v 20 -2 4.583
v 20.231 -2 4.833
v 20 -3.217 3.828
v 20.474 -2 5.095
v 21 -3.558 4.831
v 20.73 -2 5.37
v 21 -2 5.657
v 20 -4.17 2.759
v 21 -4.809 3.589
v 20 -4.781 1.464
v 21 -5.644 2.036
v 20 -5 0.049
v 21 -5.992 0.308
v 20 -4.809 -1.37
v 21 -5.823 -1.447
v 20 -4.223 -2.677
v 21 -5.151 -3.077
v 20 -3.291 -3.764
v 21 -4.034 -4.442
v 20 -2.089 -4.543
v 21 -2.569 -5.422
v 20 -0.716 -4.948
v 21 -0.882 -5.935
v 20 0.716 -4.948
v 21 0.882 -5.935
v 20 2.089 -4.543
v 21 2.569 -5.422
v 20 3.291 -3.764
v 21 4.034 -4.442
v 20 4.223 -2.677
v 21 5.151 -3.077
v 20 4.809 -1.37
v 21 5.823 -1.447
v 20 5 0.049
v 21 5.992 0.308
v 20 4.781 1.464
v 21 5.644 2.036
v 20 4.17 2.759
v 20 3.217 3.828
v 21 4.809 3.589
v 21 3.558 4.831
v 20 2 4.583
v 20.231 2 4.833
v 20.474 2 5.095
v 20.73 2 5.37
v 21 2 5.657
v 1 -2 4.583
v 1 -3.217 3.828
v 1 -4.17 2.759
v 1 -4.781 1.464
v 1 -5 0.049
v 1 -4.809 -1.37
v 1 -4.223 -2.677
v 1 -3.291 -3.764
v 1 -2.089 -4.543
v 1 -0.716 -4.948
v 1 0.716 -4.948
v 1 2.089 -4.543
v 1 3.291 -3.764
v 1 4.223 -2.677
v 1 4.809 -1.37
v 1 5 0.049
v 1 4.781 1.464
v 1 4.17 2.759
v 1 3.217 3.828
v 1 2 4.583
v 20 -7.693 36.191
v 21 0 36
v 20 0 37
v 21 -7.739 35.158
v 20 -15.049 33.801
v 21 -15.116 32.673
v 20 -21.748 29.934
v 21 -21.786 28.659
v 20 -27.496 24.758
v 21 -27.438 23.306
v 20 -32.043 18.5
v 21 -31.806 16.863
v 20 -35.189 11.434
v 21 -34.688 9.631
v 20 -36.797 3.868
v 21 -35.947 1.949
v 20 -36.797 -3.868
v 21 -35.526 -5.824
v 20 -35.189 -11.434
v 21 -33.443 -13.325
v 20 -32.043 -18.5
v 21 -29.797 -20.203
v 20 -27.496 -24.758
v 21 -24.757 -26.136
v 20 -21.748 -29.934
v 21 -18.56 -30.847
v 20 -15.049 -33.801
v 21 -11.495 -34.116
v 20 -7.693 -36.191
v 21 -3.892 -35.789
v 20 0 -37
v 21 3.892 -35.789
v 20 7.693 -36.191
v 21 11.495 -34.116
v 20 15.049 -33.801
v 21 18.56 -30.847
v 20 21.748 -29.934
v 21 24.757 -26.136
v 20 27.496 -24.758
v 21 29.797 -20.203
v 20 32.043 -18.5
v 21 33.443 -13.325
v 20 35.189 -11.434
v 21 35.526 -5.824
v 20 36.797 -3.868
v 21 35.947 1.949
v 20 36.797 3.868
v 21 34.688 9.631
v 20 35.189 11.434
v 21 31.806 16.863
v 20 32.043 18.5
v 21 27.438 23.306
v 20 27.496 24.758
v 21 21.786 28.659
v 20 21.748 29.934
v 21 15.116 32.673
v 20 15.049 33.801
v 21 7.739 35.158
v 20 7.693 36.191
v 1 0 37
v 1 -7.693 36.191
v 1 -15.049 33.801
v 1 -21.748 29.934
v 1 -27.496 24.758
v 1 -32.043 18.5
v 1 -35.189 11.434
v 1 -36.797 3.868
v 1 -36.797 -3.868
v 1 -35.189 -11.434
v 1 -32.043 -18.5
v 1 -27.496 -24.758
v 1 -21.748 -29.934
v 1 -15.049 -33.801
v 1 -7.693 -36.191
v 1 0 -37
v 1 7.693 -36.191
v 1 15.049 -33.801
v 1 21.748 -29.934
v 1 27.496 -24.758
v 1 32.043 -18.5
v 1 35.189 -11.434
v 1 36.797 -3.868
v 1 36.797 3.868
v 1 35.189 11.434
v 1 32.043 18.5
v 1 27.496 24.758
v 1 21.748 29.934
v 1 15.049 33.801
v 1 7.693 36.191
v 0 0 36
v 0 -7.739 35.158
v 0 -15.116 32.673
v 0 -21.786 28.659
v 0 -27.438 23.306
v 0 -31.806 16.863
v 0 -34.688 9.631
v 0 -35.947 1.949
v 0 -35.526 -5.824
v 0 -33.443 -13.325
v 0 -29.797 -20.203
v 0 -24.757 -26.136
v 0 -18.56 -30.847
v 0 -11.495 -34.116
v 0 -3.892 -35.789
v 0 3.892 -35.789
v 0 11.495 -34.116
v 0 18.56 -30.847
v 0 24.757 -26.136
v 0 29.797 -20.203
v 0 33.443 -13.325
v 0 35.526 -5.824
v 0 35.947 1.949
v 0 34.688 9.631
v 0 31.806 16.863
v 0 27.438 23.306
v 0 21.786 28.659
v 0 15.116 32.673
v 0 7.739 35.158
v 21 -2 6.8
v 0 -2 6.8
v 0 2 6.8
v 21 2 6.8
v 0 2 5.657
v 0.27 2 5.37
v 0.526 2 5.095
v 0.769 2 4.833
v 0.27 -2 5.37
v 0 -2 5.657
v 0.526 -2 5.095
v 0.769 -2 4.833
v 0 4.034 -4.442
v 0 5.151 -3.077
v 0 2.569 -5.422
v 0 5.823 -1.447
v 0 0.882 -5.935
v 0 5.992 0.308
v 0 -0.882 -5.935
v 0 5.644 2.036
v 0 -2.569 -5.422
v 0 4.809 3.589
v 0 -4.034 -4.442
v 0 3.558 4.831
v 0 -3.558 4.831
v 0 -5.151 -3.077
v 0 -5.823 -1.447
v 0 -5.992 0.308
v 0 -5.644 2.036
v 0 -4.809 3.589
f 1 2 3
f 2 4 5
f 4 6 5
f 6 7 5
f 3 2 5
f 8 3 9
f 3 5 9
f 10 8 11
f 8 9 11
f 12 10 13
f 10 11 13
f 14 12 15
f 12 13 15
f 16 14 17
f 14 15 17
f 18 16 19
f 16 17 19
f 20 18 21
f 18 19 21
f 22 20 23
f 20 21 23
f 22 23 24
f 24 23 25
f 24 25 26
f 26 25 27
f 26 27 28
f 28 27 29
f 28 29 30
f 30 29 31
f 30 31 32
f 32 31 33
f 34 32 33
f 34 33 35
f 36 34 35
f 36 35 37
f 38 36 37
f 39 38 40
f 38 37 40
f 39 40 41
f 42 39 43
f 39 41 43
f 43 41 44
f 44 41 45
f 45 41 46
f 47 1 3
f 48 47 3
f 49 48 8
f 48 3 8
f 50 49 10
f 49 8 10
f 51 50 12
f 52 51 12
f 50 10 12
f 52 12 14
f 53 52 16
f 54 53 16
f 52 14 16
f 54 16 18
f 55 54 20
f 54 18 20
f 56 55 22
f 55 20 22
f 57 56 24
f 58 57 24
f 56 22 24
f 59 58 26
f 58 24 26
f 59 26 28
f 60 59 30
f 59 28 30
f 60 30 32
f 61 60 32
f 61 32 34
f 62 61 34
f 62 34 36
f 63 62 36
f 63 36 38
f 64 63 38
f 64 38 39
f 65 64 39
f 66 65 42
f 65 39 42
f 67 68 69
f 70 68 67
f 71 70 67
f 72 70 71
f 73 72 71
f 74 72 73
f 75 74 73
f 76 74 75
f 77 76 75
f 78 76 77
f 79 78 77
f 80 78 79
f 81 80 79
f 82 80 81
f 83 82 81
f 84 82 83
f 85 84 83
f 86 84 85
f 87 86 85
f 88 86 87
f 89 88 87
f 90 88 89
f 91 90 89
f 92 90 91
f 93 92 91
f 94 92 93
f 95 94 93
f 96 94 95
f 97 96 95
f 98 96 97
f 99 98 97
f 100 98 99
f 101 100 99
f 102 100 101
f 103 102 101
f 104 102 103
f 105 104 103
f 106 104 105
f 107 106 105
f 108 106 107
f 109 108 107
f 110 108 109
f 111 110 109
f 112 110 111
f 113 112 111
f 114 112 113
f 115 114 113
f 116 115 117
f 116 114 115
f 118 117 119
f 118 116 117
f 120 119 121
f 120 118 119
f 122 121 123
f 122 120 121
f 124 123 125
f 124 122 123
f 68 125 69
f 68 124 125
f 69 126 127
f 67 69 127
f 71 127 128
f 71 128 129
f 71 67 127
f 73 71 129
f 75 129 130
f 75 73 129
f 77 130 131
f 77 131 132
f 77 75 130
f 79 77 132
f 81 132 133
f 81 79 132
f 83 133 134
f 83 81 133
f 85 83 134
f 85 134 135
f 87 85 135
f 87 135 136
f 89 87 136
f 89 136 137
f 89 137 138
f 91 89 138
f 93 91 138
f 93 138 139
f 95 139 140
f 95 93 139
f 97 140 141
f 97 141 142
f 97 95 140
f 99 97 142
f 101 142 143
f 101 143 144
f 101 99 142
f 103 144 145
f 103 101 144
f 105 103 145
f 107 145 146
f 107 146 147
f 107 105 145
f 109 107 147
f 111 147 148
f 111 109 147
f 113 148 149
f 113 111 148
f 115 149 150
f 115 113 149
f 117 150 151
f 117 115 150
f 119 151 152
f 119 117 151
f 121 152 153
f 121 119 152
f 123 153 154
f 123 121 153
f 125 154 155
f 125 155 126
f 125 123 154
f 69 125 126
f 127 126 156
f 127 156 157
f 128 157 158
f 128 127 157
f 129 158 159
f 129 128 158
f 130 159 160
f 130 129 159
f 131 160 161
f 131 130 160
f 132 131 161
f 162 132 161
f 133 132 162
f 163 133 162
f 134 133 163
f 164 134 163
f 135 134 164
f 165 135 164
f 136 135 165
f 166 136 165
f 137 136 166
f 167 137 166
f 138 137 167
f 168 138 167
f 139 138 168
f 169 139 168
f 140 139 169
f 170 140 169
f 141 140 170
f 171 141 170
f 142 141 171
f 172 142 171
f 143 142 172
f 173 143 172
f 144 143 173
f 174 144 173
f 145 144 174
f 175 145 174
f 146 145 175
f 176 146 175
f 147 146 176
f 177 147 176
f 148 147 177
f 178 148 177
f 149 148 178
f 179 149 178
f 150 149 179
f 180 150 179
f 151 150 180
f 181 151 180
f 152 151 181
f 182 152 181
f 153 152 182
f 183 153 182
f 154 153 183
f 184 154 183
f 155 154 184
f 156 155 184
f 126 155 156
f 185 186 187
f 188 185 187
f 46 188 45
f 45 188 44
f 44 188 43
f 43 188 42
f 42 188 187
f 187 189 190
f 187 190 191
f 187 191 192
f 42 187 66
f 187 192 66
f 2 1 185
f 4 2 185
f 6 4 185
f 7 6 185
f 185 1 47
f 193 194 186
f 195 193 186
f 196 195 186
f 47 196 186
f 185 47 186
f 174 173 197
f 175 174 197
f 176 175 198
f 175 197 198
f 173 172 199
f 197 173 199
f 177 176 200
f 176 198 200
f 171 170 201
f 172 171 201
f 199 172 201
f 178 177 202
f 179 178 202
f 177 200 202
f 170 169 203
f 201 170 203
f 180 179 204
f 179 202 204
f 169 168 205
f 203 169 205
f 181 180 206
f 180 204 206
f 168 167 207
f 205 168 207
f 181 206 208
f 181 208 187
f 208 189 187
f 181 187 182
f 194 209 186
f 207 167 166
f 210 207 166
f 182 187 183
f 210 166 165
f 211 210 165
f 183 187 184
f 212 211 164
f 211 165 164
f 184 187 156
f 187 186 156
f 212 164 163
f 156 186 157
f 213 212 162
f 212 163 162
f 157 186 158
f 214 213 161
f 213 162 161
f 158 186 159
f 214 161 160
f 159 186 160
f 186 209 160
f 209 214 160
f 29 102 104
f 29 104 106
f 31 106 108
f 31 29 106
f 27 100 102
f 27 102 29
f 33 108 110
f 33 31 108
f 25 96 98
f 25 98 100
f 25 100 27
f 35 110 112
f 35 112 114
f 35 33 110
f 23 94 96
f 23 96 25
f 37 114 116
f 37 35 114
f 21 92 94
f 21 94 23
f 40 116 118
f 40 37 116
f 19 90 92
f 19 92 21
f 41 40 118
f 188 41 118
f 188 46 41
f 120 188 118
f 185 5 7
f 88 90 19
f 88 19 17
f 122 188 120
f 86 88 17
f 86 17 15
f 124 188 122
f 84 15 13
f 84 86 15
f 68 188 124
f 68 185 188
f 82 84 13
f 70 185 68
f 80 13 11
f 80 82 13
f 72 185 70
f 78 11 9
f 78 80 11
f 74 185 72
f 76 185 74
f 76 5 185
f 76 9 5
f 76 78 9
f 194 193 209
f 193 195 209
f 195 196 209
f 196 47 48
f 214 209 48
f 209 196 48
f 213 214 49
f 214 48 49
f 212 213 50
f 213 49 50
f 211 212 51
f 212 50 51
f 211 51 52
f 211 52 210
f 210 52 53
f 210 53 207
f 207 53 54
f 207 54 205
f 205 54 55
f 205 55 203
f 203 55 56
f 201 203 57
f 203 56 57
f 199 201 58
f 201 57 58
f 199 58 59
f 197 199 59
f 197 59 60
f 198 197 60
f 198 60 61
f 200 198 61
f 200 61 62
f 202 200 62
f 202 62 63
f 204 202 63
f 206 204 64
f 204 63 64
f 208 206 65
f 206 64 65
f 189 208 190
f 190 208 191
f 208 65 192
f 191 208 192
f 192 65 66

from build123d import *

# Parameters (mm, degrees)
SKETCH1_W          = 21
SKETCH1_H          = 32
CUT_EXTRUDE2_DEPTH = 57.382621436
CHAMFER1_SIZE      = 1


with BuildPart() as part:
    # Sketch1 → Revolve1 (revolve)
    with BuildSketch(Plane(origin=(0, 0, 0), x_dir=(1, 0, 0), z_dir=(0, 1, 0))):
        with Locations((10.5, -21)):
            Rectangle(SKETCH1_W, SKETCH1_H)
    revolve(axis=Axis((0, 0, 0), (1, 0, 0)))

    # Sketch2 → Cut-Extrude2 (cut, through all)
    with BuildSketch(Plane(origin=(0, 0, 0), x_dir=(0, 0, -1), z_dir=(1, 0, 0))):
        with BuildLine():
            Line((-4.582575695, -2), (-6.8, -2))
            Line((-6.8, -2), (-6.8, 2))
            Line((-6.8, 2), (-4.582575695, 2))
            ThreePointArc((-4.582575695, 2), (-5, 0), (-4.582575695, -2))
        make_face()
    extrude(amount=CUT_EXTRUDE2_DEPTH, mode=Mode.SUBTRACT)

    # Chamfer1
    chamfer1_edges = [part.edges().sort_by_distance(p)[0] for p in [
        (0, 0, -37),
        (21, 0, -37),
        (21, 0, -5),
        (0, 0, -5),
    ]]
    chamfer(chamfer1_edges, length=CHAMFER1_SIZE)


solid = part.part
